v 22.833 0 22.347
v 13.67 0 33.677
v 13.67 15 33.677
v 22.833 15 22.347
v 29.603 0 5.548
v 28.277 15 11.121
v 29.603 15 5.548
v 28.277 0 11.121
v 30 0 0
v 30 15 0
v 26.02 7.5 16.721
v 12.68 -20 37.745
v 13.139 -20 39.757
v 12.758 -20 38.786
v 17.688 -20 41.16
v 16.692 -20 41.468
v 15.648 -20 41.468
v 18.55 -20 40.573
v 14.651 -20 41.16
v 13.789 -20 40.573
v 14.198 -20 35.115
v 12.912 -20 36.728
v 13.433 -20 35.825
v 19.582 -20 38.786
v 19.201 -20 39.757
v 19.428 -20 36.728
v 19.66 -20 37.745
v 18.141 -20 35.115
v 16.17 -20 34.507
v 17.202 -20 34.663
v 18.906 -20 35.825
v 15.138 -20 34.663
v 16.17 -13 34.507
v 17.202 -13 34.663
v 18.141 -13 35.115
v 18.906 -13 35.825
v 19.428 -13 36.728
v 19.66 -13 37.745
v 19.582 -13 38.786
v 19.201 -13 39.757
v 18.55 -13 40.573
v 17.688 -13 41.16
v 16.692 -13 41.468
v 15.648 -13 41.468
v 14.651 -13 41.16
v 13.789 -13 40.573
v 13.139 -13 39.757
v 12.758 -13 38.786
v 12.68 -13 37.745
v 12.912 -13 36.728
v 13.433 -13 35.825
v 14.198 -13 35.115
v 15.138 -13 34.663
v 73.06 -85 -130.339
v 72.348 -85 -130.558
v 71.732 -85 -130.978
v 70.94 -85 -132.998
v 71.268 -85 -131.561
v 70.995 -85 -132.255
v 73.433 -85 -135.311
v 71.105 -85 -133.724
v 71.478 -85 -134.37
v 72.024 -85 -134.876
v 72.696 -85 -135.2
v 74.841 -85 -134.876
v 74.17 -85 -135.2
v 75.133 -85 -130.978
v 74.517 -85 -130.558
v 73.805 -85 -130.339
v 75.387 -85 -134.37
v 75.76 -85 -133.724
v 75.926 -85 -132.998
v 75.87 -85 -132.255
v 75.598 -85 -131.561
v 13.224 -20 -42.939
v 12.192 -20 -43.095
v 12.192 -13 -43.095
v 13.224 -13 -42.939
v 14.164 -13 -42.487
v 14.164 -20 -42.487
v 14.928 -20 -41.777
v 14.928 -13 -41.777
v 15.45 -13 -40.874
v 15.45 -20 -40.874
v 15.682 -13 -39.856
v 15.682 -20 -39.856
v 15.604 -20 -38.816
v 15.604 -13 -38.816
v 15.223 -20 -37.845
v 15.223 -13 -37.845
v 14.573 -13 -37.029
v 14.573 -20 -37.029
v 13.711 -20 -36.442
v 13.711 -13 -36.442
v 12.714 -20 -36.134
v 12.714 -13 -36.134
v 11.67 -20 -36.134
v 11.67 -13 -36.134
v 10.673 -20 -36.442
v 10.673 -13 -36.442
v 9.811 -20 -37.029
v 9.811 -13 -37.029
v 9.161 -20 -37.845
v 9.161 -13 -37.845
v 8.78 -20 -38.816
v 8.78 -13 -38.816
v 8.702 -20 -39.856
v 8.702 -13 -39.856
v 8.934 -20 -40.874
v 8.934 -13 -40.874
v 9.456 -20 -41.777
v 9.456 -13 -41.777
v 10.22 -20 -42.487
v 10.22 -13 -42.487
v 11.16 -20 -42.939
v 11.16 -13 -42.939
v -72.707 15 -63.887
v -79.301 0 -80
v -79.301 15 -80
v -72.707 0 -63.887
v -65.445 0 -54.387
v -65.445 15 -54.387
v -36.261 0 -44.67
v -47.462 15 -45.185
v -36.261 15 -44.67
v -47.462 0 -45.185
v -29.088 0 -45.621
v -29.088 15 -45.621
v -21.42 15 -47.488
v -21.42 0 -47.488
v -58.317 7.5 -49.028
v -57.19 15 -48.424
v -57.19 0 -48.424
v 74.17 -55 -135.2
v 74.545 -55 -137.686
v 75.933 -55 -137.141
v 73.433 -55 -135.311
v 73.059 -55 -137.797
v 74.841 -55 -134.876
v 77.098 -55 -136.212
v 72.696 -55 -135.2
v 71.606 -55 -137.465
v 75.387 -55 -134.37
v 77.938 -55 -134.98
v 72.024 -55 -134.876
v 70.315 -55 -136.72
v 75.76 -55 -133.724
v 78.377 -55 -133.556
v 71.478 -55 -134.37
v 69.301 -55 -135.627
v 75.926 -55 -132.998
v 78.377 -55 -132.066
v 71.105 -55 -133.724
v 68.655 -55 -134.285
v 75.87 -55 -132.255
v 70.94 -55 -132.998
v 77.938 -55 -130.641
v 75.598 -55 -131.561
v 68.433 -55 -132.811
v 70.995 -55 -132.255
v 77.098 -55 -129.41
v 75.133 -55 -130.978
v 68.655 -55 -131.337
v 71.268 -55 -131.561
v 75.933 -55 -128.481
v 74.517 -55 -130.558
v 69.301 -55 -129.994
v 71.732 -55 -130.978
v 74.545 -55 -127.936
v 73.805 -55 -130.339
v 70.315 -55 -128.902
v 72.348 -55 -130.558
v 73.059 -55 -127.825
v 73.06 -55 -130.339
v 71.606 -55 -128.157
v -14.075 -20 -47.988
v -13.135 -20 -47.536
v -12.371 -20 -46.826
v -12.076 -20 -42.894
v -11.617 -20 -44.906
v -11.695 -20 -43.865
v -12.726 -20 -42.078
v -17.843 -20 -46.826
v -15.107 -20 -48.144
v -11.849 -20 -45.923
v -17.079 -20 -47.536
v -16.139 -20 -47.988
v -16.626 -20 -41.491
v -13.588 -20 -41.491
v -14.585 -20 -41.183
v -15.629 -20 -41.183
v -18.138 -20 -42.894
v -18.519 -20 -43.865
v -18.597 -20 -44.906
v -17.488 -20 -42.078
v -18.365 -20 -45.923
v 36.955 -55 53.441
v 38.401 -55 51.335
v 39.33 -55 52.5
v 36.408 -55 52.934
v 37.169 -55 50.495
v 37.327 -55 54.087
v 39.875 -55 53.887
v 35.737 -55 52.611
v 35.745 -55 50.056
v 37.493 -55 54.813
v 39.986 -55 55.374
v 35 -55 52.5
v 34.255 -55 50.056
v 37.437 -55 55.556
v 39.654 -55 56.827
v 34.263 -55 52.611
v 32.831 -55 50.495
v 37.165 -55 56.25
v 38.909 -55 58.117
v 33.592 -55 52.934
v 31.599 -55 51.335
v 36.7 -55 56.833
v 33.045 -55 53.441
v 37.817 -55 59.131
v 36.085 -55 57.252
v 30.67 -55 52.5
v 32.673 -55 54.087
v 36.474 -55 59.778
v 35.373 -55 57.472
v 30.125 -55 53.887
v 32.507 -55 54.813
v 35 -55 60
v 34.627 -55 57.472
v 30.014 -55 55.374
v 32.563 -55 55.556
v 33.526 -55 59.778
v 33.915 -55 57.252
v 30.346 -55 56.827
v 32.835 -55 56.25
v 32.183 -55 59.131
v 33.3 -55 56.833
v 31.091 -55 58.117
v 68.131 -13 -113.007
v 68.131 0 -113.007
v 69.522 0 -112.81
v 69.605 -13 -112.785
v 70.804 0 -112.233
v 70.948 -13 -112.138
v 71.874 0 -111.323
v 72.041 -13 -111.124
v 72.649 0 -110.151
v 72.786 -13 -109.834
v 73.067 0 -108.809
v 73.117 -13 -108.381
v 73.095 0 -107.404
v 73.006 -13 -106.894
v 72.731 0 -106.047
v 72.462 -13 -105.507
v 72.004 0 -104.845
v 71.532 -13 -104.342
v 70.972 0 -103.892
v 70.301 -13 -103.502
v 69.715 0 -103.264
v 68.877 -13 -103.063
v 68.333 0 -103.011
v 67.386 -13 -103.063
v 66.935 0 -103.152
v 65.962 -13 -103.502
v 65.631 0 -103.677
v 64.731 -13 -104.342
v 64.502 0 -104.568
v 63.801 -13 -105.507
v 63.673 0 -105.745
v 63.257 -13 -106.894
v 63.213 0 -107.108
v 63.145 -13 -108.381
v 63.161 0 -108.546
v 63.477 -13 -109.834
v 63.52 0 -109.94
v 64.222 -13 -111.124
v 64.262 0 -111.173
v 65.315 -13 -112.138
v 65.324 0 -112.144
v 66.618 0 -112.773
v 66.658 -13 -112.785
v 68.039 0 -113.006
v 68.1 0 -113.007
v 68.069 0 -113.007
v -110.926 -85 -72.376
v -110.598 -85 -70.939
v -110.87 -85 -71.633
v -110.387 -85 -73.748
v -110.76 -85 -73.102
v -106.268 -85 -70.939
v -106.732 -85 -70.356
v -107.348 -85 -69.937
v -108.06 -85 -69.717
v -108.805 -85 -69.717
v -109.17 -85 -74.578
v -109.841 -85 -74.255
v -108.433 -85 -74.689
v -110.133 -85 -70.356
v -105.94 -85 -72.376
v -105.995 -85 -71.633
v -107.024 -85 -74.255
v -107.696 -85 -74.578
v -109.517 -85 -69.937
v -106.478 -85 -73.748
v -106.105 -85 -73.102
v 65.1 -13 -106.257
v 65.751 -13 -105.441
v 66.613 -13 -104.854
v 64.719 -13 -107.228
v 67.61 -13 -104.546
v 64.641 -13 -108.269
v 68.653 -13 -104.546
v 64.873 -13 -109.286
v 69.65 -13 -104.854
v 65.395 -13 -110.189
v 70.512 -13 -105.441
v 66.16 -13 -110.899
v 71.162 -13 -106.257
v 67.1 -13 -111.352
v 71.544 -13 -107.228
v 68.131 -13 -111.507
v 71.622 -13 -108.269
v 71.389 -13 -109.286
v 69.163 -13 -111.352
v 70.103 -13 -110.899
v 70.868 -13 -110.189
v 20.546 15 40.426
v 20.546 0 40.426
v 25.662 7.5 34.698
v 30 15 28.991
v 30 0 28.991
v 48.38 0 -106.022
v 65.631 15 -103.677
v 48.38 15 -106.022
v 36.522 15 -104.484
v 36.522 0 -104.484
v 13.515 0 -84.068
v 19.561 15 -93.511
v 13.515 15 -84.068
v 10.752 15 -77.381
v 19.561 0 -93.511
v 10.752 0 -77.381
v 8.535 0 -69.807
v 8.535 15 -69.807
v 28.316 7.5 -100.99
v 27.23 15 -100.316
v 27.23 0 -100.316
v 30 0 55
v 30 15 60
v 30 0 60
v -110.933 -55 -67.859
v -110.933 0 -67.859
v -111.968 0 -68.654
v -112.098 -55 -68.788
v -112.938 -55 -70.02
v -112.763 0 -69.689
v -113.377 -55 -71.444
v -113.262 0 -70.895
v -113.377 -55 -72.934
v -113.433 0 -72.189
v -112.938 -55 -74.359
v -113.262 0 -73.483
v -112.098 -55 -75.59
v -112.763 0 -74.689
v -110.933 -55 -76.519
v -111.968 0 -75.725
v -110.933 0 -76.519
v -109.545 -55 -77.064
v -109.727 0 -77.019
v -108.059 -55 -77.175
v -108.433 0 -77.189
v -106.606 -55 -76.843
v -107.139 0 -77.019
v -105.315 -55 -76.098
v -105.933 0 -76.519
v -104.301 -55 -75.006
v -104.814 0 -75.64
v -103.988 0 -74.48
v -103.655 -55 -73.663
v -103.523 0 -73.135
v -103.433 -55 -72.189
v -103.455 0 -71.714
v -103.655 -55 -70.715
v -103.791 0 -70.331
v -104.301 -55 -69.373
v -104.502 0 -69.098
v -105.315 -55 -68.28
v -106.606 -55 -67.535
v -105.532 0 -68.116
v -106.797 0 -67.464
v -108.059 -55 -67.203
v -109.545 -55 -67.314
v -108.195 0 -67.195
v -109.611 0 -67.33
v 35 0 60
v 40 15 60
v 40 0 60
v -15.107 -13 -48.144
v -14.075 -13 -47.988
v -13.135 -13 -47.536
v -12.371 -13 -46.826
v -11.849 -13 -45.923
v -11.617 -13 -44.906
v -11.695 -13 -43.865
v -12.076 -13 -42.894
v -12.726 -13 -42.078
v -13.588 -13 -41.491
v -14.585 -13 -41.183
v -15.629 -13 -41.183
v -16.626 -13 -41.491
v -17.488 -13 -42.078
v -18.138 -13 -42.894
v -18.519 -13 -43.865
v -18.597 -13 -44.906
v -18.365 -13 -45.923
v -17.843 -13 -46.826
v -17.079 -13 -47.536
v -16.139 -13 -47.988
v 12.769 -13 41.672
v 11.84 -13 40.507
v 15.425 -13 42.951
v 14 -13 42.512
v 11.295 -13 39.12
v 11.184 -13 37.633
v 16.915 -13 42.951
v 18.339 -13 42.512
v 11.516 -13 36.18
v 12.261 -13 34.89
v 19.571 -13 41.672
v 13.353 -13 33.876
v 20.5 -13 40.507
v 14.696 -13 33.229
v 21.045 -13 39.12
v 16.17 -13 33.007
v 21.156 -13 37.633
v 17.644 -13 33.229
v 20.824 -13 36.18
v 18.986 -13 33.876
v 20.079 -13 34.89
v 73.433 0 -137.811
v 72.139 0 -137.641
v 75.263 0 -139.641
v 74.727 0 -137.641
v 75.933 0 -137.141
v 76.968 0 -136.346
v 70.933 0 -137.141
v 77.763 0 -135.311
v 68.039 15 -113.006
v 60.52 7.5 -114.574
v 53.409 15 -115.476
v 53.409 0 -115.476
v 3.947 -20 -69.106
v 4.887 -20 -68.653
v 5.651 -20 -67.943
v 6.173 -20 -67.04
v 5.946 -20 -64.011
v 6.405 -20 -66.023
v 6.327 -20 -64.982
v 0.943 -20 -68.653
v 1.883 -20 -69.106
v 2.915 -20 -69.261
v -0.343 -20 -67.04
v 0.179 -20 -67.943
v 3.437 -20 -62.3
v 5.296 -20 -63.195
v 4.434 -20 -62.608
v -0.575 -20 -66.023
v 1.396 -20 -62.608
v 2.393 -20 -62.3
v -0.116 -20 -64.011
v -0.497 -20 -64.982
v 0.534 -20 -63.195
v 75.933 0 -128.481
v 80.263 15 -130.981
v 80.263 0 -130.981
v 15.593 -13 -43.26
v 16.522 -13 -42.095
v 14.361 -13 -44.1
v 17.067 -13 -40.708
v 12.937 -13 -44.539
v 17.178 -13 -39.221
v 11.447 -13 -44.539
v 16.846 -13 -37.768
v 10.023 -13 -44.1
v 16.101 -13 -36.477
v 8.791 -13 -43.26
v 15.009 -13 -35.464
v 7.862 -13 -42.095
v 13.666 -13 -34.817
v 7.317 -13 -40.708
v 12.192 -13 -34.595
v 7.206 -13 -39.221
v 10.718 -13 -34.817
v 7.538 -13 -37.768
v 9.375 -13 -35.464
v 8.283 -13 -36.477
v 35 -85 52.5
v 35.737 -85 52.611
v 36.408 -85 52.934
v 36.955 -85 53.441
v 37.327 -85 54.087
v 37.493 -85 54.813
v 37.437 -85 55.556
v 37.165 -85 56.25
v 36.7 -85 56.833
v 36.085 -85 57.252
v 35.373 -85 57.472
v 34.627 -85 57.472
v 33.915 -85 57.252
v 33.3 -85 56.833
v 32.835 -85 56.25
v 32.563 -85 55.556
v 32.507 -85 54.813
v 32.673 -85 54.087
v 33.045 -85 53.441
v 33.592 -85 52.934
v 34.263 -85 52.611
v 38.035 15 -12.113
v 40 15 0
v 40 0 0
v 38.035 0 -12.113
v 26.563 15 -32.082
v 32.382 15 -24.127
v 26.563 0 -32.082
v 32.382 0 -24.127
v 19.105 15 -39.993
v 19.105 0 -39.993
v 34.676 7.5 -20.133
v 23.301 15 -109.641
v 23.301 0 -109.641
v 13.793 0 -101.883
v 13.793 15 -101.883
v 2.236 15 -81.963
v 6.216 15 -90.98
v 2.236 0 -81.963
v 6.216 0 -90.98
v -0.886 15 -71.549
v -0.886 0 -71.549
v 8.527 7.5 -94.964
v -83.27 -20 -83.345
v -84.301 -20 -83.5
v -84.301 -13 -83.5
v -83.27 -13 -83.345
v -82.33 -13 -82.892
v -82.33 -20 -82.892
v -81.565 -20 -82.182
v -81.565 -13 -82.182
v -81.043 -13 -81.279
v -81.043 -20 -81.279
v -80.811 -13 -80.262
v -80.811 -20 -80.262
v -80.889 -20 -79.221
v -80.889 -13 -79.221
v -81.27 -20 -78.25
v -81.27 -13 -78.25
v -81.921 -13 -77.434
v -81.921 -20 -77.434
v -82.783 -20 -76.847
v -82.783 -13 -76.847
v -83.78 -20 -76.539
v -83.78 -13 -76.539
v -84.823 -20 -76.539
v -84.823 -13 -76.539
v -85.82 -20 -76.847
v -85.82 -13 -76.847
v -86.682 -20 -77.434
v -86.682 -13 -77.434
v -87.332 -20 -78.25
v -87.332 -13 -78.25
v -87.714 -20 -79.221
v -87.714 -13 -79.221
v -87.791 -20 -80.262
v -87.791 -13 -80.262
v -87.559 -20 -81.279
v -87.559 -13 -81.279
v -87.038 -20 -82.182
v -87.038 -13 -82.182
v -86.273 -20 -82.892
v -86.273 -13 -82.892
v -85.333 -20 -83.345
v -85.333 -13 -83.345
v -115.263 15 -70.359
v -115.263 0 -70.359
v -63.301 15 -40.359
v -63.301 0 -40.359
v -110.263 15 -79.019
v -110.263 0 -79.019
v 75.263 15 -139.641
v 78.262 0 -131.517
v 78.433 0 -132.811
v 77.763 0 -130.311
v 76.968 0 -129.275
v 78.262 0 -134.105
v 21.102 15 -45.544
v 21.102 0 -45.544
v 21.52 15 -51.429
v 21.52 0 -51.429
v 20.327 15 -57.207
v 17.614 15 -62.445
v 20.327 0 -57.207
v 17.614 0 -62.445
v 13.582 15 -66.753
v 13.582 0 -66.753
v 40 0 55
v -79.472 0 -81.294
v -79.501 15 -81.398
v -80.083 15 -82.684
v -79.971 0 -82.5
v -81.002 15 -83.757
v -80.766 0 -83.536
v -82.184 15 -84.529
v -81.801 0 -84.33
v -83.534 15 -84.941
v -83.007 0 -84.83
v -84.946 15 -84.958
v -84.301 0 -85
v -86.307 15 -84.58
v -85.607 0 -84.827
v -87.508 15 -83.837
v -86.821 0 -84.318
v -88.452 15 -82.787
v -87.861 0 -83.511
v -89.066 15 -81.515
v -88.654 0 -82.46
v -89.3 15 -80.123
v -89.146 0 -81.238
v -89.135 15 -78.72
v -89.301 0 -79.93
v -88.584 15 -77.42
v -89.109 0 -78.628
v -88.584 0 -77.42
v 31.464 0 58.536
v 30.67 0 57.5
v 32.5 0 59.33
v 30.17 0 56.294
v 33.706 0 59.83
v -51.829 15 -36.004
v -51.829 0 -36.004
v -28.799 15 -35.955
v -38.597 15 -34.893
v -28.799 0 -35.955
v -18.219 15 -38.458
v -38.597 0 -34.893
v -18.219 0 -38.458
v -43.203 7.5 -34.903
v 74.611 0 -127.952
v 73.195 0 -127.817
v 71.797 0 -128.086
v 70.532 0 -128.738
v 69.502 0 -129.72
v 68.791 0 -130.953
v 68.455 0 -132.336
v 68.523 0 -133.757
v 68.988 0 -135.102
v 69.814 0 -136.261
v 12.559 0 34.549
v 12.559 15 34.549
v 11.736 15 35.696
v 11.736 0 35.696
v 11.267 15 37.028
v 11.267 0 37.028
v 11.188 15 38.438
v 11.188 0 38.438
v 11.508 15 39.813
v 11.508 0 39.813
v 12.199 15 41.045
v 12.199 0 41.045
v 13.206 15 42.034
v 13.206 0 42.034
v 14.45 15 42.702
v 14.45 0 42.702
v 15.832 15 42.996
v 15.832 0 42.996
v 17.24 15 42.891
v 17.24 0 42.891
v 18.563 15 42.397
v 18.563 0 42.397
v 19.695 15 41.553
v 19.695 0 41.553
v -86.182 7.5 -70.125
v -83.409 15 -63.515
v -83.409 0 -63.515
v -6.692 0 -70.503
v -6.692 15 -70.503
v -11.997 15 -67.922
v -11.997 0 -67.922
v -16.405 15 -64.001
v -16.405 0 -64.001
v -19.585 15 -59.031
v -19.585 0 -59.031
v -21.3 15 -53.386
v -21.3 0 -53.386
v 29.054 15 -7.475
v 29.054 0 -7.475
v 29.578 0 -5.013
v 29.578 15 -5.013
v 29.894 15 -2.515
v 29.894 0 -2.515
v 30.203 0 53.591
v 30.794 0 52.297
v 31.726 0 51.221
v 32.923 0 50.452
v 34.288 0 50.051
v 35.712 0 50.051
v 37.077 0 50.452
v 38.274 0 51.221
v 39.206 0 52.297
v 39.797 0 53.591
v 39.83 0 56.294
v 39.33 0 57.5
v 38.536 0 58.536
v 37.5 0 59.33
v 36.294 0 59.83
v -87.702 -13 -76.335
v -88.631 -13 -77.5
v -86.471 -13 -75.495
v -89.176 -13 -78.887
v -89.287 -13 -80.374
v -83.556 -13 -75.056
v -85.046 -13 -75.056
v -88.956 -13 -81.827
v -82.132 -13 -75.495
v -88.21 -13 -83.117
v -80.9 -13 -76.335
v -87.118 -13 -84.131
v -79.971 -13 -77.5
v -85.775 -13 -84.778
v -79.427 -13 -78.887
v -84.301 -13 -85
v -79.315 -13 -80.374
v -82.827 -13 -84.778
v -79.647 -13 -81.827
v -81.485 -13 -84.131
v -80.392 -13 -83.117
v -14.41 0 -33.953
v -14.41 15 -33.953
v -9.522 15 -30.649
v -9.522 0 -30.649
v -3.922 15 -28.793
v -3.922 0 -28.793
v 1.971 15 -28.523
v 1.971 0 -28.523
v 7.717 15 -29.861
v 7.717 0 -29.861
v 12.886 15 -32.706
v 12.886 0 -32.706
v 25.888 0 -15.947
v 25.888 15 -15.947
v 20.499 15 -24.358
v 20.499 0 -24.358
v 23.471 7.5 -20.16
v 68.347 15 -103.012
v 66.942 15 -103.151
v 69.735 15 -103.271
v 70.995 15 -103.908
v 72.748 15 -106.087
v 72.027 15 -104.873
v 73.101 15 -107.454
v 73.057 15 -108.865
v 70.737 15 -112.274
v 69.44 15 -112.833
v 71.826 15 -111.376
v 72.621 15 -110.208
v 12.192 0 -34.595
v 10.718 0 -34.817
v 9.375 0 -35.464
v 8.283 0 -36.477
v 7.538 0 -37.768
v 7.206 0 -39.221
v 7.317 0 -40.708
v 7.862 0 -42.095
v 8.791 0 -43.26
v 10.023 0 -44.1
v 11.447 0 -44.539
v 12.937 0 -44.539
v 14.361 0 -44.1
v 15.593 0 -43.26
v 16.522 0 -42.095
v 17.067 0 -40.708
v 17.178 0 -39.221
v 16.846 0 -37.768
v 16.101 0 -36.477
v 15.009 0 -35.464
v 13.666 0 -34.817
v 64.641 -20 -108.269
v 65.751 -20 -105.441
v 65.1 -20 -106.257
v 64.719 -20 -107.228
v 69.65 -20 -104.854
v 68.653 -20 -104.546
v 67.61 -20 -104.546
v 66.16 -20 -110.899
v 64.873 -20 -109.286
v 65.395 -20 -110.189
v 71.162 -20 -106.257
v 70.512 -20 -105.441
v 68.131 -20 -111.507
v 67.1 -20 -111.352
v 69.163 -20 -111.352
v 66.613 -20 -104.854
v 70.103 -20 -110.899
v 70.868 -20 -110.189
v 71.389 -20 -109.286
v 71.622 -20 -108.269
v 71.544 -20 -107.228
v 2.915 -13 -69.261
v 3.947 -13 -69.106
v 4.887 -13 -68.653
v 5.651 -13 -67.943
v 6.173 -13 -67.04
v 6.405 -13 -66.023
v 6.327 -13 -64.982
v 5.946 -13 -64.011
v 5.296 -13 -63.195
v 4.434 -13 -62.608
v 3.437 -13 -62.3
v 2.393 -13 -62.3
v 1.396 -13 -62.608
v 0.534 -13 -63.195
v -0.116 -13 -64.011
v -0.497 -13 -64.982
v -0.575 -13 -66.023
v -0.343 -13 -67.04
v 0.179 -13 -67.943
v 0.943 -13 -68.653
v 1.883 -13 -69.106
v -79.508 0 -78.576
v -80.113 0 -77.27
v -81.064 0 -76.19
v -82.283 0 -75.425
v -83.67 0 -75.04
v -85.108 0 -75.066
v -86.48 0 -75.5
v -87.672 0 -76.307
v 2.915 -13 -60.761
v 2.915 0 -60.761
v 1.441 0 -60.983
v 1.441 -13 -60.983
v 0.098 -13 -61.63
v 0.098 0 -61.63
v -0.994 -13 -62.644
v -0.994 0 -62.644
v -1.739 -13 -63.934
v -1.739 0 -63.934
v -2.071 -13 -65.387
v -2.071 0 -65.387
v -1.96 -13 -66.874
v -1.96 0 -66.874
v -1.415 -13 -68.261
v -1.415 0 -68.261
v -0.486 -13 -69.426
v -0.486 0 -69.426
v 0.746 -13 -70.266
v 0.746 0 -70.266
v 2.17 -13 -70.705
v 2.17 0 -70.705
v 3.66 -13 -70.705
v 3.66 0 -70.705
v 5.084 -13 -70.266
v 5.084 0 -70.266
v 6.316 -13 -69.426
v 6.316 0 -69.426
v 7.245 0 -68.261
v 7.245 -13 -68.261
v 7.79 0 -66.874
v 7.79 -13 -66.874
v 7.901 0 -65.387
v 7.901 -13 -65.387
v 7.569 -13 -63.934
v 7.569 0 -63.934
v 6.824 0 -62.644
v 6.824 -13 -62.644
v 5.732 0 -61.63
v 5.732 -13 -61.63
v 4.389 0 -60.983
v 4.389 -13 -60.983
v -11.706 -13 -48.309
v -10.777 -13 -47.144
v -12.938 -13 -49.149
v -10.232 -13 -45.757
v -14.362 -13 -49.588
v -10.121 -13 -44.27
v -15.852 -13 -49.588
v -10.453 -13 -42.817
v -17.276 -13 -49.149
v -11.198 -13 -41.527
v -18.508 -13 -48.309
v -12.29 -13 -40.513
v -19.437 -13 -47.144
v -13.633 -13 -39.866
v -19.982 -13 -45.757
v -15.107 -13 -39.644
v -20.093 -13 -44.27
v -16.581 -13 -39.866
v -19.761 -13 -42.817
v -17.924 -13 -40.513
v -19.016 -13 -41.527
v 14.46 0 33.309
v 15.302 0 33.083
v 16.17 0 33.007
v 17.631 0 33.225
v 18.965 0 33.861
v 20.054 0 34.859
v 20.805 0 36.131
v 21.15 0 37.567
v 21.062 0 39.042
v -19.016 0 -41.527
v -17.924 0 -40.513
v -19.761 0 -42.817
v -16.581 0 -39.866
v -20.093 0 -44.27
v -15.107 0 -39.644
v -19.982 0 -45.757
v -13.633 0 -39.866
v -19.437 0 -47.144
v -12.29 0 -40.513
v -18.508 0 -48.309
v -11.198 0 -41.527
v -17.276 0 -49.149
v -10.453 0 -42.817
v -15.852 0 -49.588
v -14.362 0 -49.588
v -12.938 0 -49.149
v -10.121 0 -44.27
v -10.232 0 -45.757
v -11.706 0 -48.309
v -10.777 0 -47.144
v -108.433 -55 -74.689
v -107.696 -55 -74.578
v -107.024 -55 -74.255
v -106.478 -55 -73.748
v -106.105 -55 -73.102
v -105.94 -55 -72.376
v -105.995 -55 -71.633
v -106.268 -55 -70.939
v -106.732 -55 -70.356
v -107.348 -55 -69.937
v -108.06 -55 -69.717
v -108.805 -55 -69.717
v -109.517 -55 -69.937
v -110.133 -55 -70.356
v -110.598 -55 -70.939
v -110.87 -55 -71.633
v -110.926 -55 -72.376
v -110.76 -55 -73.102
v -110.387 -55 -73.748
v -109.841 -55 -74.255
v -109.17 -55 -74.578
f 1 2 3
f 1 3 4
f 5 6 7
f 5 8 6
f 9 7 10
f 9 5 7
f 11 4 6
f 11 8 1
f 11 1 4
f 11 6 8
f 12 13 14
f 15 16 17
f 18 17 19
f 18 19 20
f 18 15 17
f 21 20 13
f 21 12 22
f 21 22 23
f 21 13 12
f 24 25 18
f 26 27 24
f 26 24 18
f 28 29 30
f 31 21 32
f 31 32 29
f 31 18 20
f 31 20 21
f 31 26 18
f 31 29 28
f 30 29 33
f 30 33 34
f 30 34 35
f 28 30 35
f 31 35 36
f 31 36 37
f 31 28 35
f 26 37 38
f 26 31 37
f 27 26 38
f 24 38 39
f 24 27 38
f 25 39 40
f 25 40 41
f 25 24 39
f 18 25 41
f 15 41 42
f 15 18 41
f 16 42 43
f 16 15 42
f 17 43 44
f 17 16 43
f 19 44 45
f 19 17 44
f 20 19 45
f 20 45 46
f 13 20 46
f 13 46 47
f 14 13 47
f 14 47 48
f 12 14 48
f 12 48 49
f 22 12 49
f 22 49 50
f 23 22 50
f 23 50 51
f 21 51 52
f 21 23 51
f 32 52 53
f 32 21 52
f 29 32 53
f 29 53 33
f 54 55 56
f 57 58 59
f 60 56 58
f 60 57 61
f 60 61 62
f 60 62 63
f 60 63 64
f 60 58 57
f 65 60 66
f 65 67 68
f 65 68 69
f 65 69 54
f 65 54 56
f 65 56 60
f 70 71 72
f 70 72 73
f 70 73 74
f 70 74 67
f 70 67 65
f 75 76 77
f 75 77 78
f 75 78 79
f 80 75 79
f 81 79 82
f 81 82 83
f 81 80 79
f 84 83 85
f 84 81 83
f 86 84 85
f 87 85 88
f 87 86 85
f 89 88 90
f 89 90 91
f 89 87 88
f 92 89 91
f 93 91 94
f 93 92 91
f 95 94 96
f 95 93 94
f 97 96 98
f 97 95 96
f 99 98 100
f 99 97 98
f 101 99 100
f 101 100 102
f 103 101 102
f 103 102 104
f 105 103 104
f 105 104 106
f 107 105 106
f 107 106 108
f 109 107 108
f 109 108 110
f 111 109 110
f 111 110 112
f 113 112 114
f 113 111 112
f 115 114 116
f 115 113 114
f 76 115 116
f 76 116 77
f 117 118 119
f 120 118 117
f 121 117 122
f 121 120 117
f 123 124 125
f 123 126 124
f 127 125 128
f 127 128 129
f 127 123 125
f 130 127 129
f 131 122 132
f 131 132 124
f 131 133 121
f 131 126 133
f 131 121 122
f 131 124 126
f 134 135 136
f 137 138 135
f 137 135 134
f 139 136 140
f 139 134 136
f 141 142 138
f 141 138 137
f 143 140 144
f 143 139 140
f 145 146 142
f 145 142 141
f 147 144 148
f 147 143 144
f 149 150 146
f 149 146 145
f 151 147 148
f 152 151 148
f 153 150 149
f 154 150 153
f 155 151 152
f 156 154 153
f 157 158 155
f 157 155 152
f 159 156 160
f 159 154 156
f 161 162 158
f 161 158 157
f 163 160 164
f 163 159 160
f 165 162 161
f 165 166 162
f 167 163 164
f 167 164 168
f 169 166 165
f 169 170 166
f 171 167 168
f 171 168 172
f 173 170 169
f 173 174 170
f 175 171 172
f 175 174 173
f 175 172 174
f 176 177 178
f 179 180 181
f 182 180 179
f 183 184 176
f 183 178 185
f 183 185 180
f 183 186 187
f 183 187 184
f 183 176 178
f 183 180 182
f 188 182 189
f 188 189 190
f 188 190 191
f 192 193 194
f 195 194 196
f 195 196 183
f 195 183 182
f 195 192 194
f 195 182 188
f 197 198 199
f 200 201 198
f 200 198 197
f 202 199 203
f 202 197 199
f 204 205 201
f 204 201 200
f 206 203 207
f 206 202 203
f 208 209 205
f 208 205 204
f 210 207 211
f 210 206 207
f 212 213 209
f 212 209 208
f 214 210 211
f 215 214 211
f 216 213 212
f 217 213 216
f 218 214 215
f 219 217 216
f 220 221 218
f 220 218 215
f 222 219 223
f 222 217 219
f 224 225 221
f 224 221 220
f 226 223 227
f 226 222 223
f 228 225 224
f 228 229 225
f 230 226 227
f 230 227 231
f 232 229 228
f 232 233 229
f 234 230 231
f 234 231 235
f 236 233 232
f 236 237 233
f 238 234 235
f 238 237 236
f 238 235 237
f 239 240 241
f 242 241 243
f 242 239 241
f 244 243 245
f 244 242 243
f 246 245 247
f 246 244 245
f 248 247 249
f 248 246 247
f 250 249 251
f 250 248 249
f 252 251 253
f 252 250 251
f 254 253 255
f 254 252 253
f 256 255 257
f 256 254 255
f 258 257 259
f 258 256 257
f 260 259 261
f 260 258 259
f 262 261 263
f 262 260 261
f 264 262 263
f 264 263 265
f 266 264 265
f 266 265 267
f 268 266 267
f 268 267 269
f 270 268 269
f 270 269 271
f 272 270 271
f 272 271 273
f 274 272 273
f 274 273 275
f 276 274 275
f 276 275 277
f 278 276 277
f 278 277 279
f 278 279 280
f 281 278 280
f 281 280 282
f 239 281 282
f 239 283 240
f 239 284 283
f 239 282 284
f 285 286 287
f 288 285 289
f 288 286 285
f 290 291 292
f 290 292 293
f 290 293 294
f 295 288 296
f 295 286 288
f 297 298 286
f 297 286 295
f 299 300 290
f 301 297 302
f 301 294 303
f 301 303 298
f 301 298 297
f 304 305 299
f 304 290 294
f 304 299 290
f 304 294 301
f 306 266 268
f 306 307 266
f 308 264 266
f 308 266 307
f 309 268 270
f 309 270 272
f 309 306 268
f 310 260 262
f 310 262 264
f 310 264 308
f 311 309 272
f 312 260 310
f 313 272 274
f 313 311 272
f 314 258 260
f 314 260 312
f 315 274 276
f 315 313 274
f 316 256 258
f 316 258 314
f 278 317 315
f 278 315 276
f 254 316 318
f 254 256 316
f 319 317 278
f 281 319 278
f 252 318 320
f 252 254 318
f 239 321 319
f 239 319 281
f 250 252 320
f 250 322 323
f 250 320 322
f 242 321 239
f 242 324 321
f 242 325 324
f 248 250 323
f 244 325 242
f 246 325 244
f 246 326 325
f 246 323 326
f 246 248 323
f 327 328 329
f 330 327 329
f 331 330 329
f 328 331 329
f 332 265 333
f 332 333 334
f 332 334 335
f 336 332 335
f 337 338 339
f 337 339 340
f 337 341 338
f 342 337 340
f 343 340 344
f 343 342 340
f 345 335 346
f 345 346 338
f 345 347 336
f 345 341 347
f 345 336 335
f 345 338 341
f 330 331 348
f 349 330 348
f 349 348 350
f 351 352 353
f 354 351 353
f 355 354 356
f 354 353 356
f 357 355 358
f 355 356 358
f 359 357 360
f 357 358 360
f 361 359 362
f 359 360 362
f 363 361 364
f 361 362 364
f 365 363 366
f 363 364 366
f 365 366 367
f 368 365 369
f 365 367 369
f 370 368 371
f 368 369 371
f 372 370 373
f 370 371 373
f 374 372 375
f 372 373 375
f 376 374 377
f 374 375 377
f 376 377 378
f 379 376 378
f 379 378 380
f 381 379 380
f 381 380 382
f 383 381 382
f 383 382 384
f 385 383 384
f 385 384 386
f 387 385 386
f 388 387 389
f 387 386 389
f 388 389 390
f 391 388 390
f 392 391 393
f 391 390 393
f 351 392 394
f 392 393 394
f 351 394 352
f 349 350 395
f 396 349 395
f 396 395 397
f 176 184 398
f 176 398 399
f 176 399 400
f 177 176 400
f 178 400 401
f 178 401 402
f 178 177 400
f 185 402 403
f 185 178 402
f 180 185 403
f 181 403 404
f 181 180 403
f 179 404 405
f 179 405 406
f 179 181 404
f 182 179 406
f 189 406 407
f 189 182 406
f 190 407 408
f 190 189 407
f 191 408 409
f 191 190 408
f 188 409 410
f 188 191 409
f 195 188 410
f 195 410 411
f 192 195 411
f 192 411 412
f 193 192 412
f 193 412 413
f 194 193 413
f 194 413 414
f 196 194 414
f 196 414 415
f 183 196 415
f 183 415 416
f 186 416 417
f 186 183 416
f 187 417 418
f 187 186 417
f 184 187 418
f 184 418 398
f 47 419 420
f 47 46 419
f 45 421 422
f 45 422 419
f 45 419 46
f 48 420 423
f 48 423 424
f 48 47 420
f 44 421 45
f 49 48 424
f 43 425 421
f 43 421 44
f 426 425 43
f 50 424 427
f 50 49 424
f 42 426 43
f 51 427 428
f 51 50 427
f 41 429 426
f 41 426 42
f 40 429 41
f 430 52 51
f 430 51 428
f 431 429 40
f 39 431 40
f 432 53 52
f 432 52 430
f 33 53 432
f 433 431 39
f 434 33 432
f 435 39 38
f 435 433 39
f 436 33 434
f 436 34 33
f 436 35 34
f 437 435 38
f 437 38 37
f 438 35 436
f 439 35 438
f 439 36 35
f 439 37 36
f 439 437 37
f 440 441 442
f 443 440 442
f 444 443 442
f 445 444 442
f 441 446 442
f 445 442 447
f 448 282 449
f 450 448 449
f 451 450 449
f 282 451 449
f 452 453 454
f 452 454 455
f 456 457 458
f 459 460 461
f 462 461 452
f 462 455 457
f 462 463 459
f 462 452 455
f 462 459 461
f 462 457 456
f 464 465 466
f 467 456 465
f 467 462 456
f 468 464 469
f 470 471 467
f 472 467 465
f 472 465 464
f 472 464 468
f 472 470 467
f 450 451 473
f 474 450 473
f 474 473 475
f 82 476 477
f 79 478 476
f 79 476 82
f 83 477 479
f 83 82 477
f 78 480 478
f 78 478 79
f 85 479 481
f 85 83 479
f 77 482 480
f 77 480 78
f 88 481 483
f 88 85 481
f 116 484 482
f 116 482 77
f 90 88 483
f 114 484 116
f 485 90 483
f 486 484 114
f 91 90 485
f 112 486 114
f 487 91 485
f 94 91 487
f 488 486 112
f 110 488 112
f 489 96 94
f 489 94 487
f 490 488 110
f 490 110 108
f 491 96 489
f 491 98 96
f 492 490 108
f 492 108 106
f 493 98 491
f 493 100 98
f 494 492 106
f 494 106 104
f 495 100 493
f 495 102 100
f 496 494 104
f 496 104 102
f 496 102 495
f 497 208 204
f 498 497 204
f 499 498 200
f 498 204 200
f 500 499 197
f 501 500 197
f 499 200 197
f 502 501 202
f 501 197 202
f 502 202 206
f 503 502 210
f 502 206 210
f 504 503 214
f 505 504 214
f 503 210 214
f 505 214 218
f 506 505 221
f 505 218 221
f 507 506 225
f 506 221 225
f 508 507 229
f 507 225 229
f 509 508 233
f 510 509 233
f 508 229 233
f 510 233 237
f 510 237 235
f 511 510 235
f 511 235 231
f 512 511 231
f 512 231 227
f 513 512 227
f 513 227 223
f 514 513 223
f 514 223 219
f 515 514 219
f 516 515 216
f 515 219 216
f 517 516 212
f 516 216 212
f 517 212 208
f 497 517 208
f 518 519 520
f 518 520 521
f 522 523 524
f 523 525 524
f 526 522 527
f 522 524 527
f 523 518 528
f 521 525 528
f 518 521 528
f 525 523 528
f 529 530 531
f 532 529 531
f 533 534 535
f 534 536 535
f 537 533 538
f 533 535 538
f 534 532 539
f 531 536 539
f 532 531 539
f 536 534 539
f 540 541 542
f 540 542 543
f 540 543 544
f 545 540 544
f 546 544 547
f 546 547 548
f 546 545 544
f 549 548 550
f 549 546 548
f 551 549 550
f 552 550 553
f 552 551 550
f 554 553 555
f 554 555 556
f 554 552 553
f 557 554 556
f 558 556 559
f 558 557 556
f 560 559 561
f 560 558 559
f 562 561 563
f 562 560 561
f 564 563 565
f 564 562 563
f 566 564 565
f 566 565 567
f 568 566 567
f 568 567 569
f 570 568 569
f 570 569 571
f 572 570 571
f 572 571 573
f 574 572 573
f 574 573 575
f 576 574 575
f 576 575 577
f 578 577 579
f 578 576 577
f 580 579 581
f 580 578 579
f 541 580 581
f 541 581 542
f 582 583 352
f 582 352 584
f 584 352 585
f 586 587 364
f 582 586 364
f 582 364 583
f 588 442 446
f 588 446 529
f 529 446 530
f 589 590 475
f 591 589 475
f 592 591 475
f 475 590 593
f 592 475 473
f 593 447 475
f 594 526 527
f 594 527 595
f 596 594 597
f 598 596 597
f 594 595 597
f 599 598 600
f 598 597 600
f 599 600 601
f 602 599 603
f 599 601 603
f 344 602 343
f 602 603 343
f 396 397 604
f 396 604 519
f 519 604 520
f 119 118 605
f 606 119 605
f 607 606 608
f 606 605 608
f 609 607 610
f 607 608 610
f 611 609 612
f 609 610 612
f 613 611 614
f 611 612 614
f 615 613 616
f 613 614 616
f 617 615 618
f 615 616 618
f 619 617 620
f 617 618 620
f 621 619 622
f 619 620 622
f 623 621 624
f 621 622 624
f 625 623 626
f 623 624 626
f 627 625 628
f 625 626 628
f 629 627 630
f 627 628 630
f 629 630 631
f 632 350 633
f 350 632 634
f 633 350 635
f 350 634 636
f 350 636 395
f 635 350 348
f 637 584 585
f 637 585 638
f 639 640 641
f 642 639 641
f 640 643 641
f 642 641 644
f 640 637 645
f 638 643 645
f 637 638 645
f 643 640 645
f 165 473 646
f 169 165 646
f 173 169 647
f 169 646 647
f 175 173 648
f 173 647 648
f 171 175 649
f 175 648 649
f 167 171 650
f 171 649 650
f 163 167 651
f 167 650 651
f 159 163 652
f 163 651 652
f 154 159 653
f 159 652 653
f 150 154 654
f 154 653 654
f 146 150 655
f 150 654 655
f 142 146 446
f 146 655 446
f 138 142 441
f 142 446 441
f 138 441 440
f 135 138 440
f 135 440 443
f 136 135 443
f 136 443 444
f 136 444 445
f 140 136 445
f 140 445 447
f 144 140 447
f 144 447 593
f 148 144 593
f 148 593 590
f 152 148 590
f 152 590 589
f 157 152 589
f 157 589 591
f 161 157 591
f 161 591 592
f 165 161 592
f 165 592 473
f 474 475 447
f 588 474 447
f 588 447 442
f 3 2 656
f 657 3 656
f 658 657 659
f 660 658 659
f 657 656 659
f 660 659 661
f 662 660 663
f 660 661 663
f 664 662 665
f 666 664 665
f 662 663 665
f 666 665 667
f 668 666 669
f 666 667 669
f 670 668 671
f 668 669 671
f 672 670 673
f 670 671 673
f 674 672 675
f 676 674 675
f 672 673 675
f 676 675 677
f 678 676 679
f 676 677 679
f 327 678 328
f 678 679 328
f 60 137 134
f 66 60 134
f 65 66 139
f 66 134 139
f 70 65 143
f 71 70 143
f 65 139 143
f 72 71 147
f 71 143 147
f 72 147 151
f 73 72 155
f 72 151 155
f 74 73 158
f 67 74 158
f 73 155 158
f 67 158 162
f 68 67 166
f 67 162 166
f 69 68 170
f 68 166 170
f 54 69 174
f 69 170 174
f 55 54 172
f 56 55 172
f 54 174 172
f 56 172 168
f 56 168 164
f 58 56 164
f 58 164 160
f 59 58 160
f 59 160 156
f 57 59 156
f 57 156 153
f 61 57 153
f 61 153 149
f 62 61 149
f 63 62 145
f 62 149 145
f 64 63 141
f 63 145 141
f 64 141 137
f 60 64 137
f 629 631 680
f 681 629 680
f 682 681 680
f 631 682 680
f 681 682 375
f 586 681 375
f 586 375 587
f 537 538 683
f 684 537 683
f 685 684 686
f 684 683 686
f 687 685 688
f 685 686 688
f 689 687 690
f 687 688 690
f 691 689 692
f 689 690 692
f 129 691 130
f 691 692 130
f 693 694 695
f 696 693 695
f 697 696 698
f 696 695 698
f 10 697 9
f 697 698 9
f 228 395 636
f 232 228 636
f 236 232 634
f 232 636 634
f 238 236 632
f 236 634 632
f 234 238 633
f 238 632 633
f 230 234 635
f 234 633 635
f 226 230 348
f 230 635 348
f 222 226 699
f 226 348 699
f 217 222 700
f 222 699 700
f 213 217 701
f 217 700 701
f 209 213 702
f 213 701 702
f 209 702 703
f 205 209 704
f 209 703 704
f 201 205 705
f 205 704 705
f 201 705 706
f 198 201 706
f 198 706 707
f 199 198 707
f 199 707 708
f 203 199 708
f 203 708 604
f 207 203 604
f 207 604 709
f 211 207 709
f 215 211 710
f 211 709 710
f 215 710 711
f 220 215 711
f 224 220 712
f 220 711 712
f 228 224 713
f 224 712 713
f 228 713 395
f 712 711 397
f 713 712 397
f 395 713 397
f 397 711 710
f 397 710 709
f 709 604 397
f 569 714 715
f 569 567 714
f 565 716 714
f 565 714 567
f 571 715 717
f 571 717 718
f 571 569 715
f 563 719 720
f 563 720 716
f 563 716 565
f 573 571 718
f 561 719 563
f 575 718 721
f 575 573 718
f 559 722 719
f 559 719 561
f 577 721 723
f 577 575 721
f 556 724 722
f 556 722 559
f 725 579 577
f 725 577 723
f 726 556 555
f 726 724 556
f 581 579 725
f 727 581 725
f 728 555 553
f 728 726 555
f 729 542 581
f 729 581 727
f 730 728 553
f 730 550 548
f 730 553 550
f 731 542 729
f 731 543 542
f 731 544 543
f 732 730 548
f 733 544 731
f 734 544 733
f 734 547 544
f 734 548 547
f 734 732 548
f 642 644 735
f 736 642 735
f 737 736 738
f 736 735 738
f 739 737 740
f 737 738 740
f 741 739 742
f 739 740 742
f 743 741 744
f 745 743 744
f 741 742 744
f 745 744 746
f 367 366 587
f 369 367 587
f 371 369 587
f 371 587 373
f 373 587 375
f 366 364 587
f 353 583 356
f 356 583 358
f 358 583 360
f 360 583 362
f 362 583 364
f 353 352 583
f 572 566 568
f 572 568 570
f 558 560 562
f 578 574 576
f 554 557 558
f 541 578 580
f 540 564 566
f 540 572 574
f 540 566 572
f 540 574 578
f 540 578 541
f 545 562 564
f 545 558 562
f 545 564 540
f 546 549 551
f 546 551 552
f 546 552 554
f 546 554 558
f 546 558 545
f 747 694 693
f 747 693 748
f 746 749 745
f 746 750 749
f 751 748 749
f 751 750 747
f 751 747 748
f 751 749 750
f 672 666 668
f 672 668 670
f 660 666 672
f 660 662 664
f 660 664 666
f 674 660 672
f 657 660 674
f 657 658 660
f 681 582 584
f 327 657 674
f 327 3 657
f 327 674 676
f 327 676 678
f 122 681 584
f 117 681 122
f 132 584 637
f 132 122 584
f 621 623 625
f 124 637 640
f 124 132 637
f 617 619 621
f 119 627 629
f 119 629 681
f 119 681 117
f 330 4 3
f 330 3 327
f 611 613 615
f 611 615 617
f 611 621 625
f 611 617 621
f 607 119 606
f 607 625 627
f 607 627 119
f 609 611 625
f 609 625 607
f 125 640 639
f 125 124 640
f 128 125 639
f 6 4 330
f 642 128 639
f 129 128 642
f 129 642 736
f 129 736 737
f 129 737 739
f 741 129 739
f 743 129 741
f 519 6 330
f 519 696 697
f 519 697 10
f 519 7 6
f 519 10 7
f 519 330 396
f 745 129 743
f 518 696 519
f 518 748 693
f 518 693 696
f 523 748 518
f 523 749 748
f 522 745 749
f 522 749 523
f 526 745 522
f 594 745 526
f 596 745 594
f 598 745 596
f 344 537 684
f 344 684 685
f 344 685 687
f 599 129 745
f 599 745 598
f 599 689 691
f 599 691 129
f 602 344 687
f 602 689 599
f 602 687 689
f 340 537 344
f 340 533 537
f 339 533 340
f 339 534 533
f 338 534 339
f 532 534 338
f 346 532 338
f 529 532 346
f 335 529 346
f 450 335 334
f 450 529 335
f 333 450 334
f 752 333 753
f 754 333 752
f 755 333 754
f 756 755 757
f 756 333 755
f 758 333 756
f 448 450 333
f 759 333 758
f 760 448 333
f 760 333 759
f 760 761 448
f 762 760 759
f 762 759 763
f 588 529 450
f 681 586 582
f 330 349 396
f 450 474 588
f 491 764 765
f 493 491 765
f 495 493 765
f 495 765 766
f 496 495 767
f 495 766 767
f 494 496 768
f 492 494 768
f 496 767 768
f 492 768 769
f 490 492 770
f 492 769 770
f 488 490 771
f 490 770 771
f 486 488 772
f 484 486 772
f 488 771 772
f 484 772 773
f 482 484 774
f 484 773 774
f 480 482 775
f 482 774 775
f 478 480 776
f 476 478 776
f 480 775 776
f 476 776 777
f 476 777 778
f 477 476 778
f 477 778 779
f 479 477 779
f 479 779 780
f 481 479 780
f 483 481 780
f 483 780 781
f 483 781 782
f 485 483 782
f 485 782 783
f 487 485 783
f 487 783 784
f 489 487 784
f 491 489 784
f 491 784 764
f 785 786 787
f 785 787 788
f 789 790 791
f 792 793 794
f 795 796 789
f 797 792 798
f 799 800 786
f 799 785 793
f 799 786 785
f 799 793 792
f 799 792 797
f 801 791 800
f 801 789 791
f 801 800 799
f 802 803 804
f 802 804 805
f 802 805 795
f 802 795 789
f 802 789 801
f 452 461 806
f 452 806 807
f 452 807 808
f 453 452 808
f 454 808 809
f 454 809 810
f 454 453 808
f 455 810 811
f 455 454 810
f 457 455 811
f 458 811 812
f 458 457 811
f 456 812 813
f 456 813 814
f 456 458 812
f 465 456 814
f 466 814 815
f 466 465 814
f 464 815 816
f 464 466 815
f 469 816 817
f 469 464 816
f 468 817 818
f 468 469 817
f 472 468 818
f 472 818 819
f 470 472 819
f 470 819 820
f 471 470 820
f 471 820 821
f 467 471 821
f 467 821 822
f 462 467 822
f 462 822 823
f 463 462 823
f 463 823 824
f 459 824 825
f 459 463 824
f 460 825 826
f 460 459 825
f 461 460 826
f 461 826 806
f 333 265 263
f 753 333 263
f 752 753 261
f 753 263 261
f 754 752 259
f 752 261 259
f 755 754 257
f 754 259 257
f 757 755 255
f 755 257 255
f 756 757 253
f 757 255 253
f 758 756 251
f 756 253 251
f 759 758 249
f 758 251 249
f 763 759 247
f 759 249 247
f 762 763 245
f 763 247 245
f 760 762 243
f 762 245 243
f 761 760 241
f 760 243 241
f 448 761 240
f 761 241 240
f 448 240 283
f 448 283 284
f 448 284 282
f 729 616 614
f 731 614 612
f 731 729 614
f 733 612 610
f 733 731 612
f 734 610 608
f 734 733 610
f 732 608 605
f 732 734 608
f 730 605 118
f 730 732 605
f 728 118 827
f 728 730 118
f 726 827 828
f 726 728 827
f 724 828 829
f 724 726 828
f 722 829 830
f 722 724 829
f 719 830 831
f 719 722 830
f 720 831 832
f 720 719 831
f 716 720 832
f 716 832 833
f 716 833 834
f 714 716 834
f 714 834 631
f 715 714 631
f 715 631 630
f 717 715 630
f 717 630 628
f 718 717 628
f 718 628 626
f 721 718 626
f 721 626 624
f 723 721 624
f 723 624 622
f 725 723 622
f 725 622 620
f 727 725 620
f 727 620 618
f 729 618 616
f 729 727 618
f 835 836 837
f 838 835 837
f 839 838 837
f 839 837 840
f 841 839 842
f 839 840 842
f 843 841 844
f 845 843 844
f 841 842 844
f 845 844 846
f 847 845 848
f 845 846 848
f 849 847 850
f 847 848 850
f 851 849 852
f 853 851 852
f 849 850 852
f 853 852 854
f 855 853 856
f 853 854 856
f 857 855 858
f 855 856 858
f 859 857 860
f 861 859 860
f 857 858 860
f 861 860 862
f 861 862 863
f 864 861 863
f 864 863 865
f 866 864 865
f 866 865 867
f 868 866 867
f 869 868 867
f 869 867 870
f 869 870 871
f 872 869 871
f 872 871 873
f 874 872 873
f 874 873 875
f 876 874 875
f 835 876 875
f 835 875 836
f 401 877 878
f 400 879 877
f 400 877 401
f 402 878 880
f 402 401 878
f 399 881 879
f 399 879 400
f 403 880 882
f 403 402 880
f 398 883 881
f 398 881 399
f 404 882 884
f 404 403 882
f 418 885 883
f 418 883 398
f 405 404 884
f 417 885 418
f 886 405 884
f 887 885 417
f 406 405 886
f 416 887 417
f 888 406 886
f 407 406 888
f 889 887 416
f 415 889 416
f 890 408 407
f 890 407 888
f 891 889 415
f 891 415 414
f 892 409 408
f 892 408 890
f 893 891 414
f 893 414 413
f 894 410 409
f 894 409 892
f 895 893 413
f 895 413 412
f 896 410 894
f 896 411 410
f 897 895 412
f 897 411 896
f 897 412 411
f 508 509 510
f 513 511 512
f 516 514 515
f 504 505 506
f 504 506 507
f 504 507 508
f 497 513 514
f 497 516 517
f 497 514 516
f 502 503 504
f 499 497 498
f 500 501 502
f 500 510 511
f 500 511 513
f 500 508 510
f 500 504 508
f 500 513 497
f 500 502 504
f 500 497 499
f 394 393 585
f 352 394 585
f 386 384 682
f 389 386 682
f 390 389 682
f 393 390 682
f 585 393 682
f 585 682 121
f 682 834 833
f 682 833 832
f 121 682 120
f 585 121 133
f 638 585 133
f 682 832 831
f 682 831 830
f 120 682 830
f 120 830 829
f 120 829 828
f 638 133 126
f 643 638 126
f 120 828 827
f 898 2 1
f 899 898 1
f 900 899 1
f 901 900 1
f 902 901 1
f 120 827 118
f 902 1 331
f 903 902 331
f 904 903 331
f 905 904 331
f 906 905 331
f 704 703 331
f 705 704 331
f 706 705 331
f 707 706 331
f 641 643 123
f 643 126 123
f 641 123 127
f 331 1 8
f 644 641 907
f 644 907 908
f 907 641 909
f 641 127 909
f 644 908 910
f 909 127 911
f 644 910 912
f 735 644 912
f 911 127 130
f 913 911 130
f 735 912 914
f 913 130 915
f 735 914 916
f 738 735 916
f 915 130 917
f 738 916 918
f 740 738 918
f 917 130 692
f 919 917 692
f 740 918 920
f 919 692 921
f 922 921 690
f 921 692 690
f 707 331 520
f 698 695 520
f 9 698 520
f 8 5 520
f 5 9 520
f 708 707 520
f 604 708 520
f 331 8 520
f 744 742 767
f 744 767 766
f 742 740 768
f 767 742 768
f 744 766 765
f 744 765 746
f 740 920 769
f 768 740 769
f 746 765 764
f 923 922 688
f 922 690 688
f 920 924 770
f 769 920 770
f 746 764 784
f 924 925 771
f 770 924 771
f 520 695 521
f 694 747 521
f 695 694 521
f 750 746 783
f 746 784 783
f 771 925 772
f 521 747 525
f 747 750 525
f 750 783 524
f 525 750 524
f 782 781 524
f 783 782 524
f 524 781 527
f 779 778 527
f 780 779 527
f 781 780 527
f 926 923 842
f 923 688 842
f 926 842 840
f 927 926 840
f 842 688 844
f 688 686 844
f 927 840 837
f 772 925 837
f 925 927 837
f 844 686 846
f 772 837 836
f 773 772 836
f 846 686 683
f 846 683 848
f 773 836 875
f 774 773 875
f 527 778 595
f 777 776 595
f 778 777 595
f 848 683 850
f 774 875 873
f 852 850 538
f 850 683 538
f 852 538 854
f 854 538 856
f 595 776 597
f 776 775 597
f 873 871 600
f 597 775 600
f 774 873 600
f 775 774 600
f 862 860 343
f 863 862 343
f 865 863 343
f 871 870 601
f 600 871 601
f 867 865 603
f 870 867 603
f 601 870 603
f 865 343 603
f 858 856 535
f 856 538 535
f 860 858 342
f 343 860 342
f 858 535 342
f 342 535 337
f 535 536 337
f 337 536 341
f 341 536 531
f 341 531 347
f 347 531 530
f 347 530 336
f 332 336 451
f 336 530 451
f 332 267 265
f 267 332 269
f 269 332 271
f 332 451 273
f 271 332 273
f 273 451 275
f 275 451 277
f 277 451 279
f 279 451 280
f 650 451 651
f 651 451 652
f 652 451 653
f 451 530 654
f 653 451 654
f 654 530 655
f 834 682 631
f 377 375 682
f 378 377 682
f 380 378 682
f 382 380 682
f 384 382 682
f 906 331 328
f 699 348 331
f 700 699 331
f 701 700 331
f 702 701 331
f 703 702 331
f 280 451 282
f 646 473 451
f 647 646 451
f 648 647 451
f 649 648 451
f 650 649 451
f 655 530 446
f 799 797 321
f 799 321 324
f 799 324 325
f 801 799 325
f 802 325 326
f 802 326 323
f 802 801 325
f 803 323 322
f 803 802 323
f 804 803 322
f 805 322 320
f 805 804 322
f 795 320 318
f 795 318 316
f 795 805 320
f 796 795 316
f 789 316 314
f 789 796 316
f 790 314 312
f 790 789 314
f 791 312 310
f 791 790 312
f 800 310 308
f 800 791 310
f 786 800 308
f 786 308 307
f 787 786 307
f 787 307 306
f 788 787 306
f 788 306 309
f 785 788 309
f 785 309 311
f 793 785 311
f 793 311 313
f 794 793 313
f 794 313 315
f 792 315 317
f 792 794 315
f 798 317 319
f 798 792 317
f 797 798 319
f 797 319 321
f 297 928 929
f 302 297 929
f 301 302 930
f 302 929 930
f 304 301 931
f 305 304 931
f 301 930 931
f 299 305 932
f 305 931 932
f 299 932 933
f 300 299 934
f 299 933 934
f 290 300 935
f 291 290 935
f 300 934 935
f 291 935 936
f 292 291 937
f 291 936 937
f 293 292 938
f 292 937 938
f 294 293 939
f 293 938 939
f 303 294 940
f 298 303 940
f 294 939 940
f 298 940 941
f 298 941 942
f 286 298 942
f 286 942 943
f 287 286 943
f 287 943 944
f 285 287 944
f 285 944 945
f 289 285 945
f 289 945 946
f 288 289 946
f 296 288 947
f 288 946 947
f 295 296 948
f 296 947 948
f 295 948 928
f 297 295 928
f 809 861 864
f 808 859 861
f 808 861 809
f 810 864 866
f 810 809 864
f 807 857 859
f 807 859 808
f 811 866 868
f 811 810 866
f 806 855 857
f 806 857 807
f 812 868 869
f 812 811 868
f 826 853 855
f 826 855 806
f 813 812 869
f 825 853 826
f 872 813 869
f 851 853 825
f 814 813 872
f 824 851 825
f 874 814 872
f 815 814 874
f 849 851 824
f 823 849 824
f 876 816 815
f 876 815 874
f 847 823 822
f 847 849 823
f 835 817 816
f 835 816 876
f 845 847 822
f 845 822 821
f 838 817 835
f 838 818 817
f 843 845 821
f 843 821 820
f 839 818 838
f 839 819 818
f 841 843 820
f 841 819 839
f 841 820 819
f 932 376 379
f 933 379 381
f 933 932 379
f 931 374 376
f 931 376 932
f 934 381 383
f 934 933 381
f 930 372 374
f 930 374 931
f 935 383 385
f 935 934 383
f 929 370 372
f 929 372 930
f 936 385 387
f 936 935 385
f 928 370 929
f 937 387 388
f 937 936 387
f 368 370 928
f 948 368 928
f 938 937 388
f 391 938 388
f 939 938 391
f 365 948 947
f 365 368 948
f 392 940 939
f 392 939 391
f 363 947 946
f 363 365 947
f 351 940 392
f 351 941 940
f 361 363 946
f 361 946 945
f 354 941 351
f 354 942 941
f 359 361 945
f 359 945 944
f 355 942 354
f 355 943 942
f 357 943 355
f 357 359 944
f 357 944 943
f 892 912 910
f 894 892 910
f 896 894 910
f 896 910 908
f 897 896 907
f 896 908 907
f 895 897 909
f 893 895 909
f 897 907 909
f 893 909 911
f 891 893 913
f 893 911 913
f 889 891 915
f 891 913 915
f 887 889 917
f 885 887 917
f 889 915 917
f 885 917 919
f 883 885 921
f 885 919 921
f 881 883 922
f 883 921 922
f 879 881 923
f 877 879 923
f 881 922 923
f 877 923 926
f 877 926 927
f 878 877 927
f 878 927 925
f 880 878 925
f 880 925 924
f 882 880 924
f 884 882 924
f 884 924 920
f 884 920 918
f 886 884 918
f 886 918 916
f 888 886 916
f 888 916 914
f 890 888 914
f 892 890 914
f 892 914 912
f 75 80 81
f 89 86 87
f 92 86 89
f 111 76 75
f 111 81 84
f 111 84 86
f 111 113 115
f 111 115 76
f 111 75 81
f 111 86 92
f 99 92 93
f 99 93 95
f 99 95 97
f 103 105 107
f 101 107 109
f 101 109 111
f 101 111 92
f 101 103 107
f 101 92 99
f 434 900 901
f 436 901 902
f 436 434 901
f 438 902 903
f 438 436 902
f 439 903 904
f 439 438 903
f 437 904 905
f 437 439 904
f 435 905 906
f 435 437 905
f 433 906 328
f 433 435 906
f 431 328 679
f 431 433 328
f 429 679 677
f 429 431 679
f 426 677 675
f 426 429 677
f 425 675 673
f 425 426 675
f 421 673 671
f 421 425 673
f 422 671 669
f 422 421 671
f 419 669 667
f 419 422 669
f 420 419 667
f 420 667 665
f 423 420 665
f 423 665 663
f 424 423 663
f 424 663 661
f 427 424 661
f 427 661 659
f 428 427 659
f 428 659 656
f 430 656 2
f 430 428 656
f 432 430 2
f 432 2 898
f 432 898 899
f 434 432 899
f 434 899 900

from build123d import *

# Parameters (mm, degrees)
BOSS_EXTRUDE2_DEPTH = 15
SKETCH4_R           = 5
BOSS_EXTRUDE3_DEPTH = 55
SKETCH5_R           = 2.5
BOSS_EXTRUDE5_DEPTH = 30
BOSS_EXTRUDE6_START = 20
SKETCH6_R           = 5
BOSS_EXTRUDE6_DEPTH = 20
SKETCH9_R           = 5
BOSS_EXTRUDE7_DEPTH = 20
SKETCH10_R          = 5
SKETCH10_R_2        = 3.5
CUT_EXTRUDE1_DEPTH  = 7


# Read off the part's stored shape, not the designer's step: Boss-Extrude2
with BuildPart() as part:
    # Boss-Extrude2 outline → Boss-Extrude2 (new body)
    with BuildSketch(Plane(origin=(0, 0, 0), x_dir=(1, 0, 0), z_dir=(0, 1, 0))):
        with BuildLine():
            ThreePointArc((-79.301270189, 80.000000278), (-85.640172505, 84.817399775), (-88.584206568, 77.419989152))
            add(Edge.make_bspline(
                [(-88.584206568, 77.419989152), (-86.367928891, 69.782262616), (-83.408582461, 63.514951385)],
                knots=[0.02157692, 0.02157692, 0.02157692, 0.151234515, 0.151234515, 0.151234515], degree=2))
            Line((-83.408582461, 63.514951385), (-110.262794416, 79.019237886))
            Line((-110.262794416, 79.019237886), (-115.262794416, 70.358983849))
            Line((-115.262794416, 70.358983849), (-63.301270189, 40.358983849))
            add(Edge.make_bspline(
                [(-63.301270189, 40.358983849), (-45.646570728, 30.396854404), (-18.218994006, 38.458495307)],
                knots=[0.484299762, 0.484299762, 0.484299762, 0.954512817, 0.954512817, 0.954512817], degree=2))
            ThreePointArc((-18.218994006, 38.458495307), (-3.922368216, 28.792616834), (12.885706155, 32.705589052))
            add(Edge.make_bspline(
                [(29.05383915, 7.474920109), (25.9728438, 20.230319759), (12.885706155, 32.705589052)],
                knots=[0.594463111, 0.594463111, 0.594463111, 0.969398026, 0.969398026, 0.969398026], degree=2))
            ThreePointArc((29.05383915, 7.474920109), (29.76251984, 3.767281878), (30, 0))
            add(Edge.make_bspline(
                [(13.669872981, -33.676914536), (30.204968933, -16.604131181), (30, 0)],
                knots=[0, 0, 0, 0.484954637, 0.484954637, 0.484954637], degree=2))
            ThreePointArc((13.669872981, -33.676914536), (12.667333455, -41.575264764), (20.545696107, -40.426167838))
            add(Edge.make_bspline(
                [(20.545696107, -40.426167838), (26.052022476, -34.6879518), (30, -28.991426998)],
                knots=[0.02157692, 0.02157692, 0.02157692, 0.151234515, 0.151234515, 0.151234515], degree=2))
            Line((30, -28.991426998), (30, -60))
            Line((30, -60), (40, -60))
            Line((40, -60), (40, 0))
            add(Edge.make_bspline(
                [(40, 0), (39.800107444, 20.270482952), (19.104733265, 39.992640706)],
                knots=[0.484299762, 0.484299762, 0.484299762, 0.954512817, 0.954512817, 0.954512817], degree=2))
            ThreePointArc((19.104733265, 39.992640706), (20.327316677, 57.206821065), (8.534546147, 69.80655435))
            add(Edge.make_bspline(
                [(65.631397208, 103.676914536), (19.549675952, 115.237660492), (8.534546147, 69.80655435)],
                knots=[0, 0, 0, 0.969398026, 0.969398026, 0.969398026], degree=2))
            ThreePointArc((65.631397208, 103.676914536), (72.972838916, 106.757864952), (68.038510461, 113.006178686))
            add(Edge.make_bspline(
                [(68.038510461, 113.006178686), (60.315906416, 114.905689184), (53.408582461, 115.476475612)],
                knots=[0.02157692, 0.02157692, 0.02157692, 0.151234515, 0.151234515, 0.151234515], degree=2))
            Line((53.408582461, 115.476475612), (80.262794416, 130.980762114))
            Line((80.262794416, 130.980762114), (75.262794416, 139.641016151))
            Line((75.262794416, 139.641016151), (23.301270189, 109.641016151))
            add(Edge.make_bspline(
                [(23.301270189, 109.641016151), (5.846463284, 99.332662644), (-0.885739259, 71.548863987)],
                knots=[0.484299762, 0.484299762, 0.484299762, 0.954512817, 0.954512817, 0.954512817], degree=2))
            ThreePointArc((-0.885739259, 71.548863987), (-16.404948461, 64.000562101), (-21.420252302, 47.487856599))
            add(Edge.make_bspline(
                [(-79.301270189, 80.000000278), (-66.272309422, 34.311685724), (-21.420252302, 47.487856599)],
                knots=[0, 0, 0, 0.969398026, 0.969398026, 0.969398026], degree=2))
        make_face()
    extrude(amount=BOSS_EXTRUDE2_DEPTH)

    # Sketch4 → Boss-Extrude3 (add)
    with BuildSketch(Plane.XZ):
        with Locations(Location((-108.432667397, -72.189110868, 0), (0, 0, 120))):
            Circle(SKETCH4_R)
        with Locations(Location((35, 55, 0), (0, 0, 90))):
            Circle(SKETCH4_R)
        with Locations(Location((73.432667397, -132.810889132, 0), (0, 0, 60))):
            Circle(SKETCH4_R)
    extrude(amount=BOSS_EXTRUDE3_DEPTH)

    # Sketch5 → Boss-Extrude5 (add)
    with BuildSketch(Plane.XZ.offset(55)):
        with Locations(Location((35, 55, 0), (0, 0, 270))):
            Circle(SKETCH5_R)
        with Locations(Location((73.432667397, -132.810889132, 0), (0, 0, 270))):
            Circle(SKETCH5_R)
        with Locations(Location((-108.432667397, -72.189110868, 0), (0, 0, 270))):
            Circle(SKETCH5_R)
    extrude(amount=BOSS_EXTRUDE5_DEPTH)

    # Sketch6 → Boss-Extrude6 (add)
    with BuildSketch(Plane.XZ.offset(BOSS_EXTRUDE6_START)):
        with Locations(Location((16.169872981, 38.007041555, 0), (0, 0, 270))):
            Circle(SKETCH6_R)
        with Locations(Location((-84.301270189, -80, 0), (0, 0, 270))):
            Circle(SKETCH6_R)
        with Locations(Location((68.131397208, -108.007041555, 0), (0, 0, 270))):
            Circle(SKETCH6_R)
    extrude(amount=-BOSS_EXTRUDE6_DEPTH)

    # Sketch9 → Boss-Extrude7 (add)
    with BuildSketch(Plane.XZ):
        with Locations(Location((-15.107039064, -44.643969537, 0), (0, 0, 90))):
            Circle(SKETCH9_R)
        with Locations(Location((12.191977977, -39.594935626, 0), (0, 0, 90))):
            Circle(SKETCH9_R)
        with Locations(Location((2.915061087, -65.761094837, 0), (0, 0, 90))):
            Circle(SKETCH9_R)
    extrude(amount=BOSS_EXTRUDE7_DEPTH)

    # Sketch10 → Cut-Extrude1 (cut)
    # profile 1 of 6: a face of its own
    with BuildSketch(Plane(origin=(0, -20, 0), x_dir=(-1, 0, 0), z_dir=(0, -1, 0))):
        with Locations(Location((-16.169872981, -38.007041555, 0), (0, 0, 90))):
            Circle(SKETCH10_R)
        with Locations(Location((-16.169872981, -38.007041555, 0), (0, 0, 90))):
            Circle(SKETCH10_R_2, mode=Mode.SUBTRACT)
    # profile 2 of 6: a face of its own
    with BuildSketch(Plane(origin=(0, -20, 0), x_dir=(-1, 0, 0), z_dir=(0, -1, 0))):
        with Locations(Location((-68.131397208, 108.007041555, 0), (0, 0, 90))):
            Circle(SKETCH10_R)
        with Locations(Location((-68.131397208, 108.007041555, 0), (0, 0, 90))):
            Circle(SKETCH10_R_2, mode=Mode.SUBTRACT)
    # profile 3 of 6: a face of its own
    with BuildSketch(Plane(origin=(0, -20, 0), x_dir=(-1, 0, 0), z_dir=(0, -1, 0))):
        with Locations(Location((-12.191977977, 39.594935626, 0), (0, 0, 270))):
            Circle(SKETCH10_R)
        with Locations(Location((-12.191977977, 39.594935626, 0), (0, 0, 90))):
            Circle(SKETCH10_R_2, mode=Mode.SUBTRACT)
    # profile 4 of 6: a face of its own
    with BuildSketch(Plane(origin=(0, -20, 0), x_dir=(-1, 0, 0), z_dir=(0, -1, 0))):
        with Locations(Location((-2.915061087, 65.761094837, 0), (0, 0, 270))):
            Circle(SKETCH10_R)
        with Locations(Location((-2.915061087, 65.761094837, 0), (0, 0, 90))):
            Circle(SKETCH10_R_2, mode=Mode.SUBTRACT)
    # profile 5 of 6: a face of its own
    with BuildSketch(Plane(origin=(0, -20, 0), x_dir=(-1, 0, 0), z_dir=(0, -1, 0))):
        with Locations(Location((15.107039064, 44.643969537, 0), (0, 0, 270))):
            Circle(SKETCH10_R)
        with Locations(Location((15.107039064, 44.643969537, 0), (0, 0, 90))):
            Circle(SKETCH10_R_2, mode=Mode.SUBTRACT)
    # profile 6 of 6: a face of its own
    with BuildSketch(Plane(origin=(0, -20, 0), x_dir=(-1, 0, 0), z_dir=(0, -1, 0))):
        with Locations(Location((84.301270189, 80, 0), (0, 0, 90))):
            Circle(SKETCH10_R)
        with Locations(Location((84.301270189, 80, 0), (0, 0, 90))):
            Circle(SKETCH10_R_2, mode=Mode.SUBTRACT)
    extrude(amount=-CUT_EXTRUDE1_DEPTH, mode=Mode.SUBTRACT)


solid = part.part
